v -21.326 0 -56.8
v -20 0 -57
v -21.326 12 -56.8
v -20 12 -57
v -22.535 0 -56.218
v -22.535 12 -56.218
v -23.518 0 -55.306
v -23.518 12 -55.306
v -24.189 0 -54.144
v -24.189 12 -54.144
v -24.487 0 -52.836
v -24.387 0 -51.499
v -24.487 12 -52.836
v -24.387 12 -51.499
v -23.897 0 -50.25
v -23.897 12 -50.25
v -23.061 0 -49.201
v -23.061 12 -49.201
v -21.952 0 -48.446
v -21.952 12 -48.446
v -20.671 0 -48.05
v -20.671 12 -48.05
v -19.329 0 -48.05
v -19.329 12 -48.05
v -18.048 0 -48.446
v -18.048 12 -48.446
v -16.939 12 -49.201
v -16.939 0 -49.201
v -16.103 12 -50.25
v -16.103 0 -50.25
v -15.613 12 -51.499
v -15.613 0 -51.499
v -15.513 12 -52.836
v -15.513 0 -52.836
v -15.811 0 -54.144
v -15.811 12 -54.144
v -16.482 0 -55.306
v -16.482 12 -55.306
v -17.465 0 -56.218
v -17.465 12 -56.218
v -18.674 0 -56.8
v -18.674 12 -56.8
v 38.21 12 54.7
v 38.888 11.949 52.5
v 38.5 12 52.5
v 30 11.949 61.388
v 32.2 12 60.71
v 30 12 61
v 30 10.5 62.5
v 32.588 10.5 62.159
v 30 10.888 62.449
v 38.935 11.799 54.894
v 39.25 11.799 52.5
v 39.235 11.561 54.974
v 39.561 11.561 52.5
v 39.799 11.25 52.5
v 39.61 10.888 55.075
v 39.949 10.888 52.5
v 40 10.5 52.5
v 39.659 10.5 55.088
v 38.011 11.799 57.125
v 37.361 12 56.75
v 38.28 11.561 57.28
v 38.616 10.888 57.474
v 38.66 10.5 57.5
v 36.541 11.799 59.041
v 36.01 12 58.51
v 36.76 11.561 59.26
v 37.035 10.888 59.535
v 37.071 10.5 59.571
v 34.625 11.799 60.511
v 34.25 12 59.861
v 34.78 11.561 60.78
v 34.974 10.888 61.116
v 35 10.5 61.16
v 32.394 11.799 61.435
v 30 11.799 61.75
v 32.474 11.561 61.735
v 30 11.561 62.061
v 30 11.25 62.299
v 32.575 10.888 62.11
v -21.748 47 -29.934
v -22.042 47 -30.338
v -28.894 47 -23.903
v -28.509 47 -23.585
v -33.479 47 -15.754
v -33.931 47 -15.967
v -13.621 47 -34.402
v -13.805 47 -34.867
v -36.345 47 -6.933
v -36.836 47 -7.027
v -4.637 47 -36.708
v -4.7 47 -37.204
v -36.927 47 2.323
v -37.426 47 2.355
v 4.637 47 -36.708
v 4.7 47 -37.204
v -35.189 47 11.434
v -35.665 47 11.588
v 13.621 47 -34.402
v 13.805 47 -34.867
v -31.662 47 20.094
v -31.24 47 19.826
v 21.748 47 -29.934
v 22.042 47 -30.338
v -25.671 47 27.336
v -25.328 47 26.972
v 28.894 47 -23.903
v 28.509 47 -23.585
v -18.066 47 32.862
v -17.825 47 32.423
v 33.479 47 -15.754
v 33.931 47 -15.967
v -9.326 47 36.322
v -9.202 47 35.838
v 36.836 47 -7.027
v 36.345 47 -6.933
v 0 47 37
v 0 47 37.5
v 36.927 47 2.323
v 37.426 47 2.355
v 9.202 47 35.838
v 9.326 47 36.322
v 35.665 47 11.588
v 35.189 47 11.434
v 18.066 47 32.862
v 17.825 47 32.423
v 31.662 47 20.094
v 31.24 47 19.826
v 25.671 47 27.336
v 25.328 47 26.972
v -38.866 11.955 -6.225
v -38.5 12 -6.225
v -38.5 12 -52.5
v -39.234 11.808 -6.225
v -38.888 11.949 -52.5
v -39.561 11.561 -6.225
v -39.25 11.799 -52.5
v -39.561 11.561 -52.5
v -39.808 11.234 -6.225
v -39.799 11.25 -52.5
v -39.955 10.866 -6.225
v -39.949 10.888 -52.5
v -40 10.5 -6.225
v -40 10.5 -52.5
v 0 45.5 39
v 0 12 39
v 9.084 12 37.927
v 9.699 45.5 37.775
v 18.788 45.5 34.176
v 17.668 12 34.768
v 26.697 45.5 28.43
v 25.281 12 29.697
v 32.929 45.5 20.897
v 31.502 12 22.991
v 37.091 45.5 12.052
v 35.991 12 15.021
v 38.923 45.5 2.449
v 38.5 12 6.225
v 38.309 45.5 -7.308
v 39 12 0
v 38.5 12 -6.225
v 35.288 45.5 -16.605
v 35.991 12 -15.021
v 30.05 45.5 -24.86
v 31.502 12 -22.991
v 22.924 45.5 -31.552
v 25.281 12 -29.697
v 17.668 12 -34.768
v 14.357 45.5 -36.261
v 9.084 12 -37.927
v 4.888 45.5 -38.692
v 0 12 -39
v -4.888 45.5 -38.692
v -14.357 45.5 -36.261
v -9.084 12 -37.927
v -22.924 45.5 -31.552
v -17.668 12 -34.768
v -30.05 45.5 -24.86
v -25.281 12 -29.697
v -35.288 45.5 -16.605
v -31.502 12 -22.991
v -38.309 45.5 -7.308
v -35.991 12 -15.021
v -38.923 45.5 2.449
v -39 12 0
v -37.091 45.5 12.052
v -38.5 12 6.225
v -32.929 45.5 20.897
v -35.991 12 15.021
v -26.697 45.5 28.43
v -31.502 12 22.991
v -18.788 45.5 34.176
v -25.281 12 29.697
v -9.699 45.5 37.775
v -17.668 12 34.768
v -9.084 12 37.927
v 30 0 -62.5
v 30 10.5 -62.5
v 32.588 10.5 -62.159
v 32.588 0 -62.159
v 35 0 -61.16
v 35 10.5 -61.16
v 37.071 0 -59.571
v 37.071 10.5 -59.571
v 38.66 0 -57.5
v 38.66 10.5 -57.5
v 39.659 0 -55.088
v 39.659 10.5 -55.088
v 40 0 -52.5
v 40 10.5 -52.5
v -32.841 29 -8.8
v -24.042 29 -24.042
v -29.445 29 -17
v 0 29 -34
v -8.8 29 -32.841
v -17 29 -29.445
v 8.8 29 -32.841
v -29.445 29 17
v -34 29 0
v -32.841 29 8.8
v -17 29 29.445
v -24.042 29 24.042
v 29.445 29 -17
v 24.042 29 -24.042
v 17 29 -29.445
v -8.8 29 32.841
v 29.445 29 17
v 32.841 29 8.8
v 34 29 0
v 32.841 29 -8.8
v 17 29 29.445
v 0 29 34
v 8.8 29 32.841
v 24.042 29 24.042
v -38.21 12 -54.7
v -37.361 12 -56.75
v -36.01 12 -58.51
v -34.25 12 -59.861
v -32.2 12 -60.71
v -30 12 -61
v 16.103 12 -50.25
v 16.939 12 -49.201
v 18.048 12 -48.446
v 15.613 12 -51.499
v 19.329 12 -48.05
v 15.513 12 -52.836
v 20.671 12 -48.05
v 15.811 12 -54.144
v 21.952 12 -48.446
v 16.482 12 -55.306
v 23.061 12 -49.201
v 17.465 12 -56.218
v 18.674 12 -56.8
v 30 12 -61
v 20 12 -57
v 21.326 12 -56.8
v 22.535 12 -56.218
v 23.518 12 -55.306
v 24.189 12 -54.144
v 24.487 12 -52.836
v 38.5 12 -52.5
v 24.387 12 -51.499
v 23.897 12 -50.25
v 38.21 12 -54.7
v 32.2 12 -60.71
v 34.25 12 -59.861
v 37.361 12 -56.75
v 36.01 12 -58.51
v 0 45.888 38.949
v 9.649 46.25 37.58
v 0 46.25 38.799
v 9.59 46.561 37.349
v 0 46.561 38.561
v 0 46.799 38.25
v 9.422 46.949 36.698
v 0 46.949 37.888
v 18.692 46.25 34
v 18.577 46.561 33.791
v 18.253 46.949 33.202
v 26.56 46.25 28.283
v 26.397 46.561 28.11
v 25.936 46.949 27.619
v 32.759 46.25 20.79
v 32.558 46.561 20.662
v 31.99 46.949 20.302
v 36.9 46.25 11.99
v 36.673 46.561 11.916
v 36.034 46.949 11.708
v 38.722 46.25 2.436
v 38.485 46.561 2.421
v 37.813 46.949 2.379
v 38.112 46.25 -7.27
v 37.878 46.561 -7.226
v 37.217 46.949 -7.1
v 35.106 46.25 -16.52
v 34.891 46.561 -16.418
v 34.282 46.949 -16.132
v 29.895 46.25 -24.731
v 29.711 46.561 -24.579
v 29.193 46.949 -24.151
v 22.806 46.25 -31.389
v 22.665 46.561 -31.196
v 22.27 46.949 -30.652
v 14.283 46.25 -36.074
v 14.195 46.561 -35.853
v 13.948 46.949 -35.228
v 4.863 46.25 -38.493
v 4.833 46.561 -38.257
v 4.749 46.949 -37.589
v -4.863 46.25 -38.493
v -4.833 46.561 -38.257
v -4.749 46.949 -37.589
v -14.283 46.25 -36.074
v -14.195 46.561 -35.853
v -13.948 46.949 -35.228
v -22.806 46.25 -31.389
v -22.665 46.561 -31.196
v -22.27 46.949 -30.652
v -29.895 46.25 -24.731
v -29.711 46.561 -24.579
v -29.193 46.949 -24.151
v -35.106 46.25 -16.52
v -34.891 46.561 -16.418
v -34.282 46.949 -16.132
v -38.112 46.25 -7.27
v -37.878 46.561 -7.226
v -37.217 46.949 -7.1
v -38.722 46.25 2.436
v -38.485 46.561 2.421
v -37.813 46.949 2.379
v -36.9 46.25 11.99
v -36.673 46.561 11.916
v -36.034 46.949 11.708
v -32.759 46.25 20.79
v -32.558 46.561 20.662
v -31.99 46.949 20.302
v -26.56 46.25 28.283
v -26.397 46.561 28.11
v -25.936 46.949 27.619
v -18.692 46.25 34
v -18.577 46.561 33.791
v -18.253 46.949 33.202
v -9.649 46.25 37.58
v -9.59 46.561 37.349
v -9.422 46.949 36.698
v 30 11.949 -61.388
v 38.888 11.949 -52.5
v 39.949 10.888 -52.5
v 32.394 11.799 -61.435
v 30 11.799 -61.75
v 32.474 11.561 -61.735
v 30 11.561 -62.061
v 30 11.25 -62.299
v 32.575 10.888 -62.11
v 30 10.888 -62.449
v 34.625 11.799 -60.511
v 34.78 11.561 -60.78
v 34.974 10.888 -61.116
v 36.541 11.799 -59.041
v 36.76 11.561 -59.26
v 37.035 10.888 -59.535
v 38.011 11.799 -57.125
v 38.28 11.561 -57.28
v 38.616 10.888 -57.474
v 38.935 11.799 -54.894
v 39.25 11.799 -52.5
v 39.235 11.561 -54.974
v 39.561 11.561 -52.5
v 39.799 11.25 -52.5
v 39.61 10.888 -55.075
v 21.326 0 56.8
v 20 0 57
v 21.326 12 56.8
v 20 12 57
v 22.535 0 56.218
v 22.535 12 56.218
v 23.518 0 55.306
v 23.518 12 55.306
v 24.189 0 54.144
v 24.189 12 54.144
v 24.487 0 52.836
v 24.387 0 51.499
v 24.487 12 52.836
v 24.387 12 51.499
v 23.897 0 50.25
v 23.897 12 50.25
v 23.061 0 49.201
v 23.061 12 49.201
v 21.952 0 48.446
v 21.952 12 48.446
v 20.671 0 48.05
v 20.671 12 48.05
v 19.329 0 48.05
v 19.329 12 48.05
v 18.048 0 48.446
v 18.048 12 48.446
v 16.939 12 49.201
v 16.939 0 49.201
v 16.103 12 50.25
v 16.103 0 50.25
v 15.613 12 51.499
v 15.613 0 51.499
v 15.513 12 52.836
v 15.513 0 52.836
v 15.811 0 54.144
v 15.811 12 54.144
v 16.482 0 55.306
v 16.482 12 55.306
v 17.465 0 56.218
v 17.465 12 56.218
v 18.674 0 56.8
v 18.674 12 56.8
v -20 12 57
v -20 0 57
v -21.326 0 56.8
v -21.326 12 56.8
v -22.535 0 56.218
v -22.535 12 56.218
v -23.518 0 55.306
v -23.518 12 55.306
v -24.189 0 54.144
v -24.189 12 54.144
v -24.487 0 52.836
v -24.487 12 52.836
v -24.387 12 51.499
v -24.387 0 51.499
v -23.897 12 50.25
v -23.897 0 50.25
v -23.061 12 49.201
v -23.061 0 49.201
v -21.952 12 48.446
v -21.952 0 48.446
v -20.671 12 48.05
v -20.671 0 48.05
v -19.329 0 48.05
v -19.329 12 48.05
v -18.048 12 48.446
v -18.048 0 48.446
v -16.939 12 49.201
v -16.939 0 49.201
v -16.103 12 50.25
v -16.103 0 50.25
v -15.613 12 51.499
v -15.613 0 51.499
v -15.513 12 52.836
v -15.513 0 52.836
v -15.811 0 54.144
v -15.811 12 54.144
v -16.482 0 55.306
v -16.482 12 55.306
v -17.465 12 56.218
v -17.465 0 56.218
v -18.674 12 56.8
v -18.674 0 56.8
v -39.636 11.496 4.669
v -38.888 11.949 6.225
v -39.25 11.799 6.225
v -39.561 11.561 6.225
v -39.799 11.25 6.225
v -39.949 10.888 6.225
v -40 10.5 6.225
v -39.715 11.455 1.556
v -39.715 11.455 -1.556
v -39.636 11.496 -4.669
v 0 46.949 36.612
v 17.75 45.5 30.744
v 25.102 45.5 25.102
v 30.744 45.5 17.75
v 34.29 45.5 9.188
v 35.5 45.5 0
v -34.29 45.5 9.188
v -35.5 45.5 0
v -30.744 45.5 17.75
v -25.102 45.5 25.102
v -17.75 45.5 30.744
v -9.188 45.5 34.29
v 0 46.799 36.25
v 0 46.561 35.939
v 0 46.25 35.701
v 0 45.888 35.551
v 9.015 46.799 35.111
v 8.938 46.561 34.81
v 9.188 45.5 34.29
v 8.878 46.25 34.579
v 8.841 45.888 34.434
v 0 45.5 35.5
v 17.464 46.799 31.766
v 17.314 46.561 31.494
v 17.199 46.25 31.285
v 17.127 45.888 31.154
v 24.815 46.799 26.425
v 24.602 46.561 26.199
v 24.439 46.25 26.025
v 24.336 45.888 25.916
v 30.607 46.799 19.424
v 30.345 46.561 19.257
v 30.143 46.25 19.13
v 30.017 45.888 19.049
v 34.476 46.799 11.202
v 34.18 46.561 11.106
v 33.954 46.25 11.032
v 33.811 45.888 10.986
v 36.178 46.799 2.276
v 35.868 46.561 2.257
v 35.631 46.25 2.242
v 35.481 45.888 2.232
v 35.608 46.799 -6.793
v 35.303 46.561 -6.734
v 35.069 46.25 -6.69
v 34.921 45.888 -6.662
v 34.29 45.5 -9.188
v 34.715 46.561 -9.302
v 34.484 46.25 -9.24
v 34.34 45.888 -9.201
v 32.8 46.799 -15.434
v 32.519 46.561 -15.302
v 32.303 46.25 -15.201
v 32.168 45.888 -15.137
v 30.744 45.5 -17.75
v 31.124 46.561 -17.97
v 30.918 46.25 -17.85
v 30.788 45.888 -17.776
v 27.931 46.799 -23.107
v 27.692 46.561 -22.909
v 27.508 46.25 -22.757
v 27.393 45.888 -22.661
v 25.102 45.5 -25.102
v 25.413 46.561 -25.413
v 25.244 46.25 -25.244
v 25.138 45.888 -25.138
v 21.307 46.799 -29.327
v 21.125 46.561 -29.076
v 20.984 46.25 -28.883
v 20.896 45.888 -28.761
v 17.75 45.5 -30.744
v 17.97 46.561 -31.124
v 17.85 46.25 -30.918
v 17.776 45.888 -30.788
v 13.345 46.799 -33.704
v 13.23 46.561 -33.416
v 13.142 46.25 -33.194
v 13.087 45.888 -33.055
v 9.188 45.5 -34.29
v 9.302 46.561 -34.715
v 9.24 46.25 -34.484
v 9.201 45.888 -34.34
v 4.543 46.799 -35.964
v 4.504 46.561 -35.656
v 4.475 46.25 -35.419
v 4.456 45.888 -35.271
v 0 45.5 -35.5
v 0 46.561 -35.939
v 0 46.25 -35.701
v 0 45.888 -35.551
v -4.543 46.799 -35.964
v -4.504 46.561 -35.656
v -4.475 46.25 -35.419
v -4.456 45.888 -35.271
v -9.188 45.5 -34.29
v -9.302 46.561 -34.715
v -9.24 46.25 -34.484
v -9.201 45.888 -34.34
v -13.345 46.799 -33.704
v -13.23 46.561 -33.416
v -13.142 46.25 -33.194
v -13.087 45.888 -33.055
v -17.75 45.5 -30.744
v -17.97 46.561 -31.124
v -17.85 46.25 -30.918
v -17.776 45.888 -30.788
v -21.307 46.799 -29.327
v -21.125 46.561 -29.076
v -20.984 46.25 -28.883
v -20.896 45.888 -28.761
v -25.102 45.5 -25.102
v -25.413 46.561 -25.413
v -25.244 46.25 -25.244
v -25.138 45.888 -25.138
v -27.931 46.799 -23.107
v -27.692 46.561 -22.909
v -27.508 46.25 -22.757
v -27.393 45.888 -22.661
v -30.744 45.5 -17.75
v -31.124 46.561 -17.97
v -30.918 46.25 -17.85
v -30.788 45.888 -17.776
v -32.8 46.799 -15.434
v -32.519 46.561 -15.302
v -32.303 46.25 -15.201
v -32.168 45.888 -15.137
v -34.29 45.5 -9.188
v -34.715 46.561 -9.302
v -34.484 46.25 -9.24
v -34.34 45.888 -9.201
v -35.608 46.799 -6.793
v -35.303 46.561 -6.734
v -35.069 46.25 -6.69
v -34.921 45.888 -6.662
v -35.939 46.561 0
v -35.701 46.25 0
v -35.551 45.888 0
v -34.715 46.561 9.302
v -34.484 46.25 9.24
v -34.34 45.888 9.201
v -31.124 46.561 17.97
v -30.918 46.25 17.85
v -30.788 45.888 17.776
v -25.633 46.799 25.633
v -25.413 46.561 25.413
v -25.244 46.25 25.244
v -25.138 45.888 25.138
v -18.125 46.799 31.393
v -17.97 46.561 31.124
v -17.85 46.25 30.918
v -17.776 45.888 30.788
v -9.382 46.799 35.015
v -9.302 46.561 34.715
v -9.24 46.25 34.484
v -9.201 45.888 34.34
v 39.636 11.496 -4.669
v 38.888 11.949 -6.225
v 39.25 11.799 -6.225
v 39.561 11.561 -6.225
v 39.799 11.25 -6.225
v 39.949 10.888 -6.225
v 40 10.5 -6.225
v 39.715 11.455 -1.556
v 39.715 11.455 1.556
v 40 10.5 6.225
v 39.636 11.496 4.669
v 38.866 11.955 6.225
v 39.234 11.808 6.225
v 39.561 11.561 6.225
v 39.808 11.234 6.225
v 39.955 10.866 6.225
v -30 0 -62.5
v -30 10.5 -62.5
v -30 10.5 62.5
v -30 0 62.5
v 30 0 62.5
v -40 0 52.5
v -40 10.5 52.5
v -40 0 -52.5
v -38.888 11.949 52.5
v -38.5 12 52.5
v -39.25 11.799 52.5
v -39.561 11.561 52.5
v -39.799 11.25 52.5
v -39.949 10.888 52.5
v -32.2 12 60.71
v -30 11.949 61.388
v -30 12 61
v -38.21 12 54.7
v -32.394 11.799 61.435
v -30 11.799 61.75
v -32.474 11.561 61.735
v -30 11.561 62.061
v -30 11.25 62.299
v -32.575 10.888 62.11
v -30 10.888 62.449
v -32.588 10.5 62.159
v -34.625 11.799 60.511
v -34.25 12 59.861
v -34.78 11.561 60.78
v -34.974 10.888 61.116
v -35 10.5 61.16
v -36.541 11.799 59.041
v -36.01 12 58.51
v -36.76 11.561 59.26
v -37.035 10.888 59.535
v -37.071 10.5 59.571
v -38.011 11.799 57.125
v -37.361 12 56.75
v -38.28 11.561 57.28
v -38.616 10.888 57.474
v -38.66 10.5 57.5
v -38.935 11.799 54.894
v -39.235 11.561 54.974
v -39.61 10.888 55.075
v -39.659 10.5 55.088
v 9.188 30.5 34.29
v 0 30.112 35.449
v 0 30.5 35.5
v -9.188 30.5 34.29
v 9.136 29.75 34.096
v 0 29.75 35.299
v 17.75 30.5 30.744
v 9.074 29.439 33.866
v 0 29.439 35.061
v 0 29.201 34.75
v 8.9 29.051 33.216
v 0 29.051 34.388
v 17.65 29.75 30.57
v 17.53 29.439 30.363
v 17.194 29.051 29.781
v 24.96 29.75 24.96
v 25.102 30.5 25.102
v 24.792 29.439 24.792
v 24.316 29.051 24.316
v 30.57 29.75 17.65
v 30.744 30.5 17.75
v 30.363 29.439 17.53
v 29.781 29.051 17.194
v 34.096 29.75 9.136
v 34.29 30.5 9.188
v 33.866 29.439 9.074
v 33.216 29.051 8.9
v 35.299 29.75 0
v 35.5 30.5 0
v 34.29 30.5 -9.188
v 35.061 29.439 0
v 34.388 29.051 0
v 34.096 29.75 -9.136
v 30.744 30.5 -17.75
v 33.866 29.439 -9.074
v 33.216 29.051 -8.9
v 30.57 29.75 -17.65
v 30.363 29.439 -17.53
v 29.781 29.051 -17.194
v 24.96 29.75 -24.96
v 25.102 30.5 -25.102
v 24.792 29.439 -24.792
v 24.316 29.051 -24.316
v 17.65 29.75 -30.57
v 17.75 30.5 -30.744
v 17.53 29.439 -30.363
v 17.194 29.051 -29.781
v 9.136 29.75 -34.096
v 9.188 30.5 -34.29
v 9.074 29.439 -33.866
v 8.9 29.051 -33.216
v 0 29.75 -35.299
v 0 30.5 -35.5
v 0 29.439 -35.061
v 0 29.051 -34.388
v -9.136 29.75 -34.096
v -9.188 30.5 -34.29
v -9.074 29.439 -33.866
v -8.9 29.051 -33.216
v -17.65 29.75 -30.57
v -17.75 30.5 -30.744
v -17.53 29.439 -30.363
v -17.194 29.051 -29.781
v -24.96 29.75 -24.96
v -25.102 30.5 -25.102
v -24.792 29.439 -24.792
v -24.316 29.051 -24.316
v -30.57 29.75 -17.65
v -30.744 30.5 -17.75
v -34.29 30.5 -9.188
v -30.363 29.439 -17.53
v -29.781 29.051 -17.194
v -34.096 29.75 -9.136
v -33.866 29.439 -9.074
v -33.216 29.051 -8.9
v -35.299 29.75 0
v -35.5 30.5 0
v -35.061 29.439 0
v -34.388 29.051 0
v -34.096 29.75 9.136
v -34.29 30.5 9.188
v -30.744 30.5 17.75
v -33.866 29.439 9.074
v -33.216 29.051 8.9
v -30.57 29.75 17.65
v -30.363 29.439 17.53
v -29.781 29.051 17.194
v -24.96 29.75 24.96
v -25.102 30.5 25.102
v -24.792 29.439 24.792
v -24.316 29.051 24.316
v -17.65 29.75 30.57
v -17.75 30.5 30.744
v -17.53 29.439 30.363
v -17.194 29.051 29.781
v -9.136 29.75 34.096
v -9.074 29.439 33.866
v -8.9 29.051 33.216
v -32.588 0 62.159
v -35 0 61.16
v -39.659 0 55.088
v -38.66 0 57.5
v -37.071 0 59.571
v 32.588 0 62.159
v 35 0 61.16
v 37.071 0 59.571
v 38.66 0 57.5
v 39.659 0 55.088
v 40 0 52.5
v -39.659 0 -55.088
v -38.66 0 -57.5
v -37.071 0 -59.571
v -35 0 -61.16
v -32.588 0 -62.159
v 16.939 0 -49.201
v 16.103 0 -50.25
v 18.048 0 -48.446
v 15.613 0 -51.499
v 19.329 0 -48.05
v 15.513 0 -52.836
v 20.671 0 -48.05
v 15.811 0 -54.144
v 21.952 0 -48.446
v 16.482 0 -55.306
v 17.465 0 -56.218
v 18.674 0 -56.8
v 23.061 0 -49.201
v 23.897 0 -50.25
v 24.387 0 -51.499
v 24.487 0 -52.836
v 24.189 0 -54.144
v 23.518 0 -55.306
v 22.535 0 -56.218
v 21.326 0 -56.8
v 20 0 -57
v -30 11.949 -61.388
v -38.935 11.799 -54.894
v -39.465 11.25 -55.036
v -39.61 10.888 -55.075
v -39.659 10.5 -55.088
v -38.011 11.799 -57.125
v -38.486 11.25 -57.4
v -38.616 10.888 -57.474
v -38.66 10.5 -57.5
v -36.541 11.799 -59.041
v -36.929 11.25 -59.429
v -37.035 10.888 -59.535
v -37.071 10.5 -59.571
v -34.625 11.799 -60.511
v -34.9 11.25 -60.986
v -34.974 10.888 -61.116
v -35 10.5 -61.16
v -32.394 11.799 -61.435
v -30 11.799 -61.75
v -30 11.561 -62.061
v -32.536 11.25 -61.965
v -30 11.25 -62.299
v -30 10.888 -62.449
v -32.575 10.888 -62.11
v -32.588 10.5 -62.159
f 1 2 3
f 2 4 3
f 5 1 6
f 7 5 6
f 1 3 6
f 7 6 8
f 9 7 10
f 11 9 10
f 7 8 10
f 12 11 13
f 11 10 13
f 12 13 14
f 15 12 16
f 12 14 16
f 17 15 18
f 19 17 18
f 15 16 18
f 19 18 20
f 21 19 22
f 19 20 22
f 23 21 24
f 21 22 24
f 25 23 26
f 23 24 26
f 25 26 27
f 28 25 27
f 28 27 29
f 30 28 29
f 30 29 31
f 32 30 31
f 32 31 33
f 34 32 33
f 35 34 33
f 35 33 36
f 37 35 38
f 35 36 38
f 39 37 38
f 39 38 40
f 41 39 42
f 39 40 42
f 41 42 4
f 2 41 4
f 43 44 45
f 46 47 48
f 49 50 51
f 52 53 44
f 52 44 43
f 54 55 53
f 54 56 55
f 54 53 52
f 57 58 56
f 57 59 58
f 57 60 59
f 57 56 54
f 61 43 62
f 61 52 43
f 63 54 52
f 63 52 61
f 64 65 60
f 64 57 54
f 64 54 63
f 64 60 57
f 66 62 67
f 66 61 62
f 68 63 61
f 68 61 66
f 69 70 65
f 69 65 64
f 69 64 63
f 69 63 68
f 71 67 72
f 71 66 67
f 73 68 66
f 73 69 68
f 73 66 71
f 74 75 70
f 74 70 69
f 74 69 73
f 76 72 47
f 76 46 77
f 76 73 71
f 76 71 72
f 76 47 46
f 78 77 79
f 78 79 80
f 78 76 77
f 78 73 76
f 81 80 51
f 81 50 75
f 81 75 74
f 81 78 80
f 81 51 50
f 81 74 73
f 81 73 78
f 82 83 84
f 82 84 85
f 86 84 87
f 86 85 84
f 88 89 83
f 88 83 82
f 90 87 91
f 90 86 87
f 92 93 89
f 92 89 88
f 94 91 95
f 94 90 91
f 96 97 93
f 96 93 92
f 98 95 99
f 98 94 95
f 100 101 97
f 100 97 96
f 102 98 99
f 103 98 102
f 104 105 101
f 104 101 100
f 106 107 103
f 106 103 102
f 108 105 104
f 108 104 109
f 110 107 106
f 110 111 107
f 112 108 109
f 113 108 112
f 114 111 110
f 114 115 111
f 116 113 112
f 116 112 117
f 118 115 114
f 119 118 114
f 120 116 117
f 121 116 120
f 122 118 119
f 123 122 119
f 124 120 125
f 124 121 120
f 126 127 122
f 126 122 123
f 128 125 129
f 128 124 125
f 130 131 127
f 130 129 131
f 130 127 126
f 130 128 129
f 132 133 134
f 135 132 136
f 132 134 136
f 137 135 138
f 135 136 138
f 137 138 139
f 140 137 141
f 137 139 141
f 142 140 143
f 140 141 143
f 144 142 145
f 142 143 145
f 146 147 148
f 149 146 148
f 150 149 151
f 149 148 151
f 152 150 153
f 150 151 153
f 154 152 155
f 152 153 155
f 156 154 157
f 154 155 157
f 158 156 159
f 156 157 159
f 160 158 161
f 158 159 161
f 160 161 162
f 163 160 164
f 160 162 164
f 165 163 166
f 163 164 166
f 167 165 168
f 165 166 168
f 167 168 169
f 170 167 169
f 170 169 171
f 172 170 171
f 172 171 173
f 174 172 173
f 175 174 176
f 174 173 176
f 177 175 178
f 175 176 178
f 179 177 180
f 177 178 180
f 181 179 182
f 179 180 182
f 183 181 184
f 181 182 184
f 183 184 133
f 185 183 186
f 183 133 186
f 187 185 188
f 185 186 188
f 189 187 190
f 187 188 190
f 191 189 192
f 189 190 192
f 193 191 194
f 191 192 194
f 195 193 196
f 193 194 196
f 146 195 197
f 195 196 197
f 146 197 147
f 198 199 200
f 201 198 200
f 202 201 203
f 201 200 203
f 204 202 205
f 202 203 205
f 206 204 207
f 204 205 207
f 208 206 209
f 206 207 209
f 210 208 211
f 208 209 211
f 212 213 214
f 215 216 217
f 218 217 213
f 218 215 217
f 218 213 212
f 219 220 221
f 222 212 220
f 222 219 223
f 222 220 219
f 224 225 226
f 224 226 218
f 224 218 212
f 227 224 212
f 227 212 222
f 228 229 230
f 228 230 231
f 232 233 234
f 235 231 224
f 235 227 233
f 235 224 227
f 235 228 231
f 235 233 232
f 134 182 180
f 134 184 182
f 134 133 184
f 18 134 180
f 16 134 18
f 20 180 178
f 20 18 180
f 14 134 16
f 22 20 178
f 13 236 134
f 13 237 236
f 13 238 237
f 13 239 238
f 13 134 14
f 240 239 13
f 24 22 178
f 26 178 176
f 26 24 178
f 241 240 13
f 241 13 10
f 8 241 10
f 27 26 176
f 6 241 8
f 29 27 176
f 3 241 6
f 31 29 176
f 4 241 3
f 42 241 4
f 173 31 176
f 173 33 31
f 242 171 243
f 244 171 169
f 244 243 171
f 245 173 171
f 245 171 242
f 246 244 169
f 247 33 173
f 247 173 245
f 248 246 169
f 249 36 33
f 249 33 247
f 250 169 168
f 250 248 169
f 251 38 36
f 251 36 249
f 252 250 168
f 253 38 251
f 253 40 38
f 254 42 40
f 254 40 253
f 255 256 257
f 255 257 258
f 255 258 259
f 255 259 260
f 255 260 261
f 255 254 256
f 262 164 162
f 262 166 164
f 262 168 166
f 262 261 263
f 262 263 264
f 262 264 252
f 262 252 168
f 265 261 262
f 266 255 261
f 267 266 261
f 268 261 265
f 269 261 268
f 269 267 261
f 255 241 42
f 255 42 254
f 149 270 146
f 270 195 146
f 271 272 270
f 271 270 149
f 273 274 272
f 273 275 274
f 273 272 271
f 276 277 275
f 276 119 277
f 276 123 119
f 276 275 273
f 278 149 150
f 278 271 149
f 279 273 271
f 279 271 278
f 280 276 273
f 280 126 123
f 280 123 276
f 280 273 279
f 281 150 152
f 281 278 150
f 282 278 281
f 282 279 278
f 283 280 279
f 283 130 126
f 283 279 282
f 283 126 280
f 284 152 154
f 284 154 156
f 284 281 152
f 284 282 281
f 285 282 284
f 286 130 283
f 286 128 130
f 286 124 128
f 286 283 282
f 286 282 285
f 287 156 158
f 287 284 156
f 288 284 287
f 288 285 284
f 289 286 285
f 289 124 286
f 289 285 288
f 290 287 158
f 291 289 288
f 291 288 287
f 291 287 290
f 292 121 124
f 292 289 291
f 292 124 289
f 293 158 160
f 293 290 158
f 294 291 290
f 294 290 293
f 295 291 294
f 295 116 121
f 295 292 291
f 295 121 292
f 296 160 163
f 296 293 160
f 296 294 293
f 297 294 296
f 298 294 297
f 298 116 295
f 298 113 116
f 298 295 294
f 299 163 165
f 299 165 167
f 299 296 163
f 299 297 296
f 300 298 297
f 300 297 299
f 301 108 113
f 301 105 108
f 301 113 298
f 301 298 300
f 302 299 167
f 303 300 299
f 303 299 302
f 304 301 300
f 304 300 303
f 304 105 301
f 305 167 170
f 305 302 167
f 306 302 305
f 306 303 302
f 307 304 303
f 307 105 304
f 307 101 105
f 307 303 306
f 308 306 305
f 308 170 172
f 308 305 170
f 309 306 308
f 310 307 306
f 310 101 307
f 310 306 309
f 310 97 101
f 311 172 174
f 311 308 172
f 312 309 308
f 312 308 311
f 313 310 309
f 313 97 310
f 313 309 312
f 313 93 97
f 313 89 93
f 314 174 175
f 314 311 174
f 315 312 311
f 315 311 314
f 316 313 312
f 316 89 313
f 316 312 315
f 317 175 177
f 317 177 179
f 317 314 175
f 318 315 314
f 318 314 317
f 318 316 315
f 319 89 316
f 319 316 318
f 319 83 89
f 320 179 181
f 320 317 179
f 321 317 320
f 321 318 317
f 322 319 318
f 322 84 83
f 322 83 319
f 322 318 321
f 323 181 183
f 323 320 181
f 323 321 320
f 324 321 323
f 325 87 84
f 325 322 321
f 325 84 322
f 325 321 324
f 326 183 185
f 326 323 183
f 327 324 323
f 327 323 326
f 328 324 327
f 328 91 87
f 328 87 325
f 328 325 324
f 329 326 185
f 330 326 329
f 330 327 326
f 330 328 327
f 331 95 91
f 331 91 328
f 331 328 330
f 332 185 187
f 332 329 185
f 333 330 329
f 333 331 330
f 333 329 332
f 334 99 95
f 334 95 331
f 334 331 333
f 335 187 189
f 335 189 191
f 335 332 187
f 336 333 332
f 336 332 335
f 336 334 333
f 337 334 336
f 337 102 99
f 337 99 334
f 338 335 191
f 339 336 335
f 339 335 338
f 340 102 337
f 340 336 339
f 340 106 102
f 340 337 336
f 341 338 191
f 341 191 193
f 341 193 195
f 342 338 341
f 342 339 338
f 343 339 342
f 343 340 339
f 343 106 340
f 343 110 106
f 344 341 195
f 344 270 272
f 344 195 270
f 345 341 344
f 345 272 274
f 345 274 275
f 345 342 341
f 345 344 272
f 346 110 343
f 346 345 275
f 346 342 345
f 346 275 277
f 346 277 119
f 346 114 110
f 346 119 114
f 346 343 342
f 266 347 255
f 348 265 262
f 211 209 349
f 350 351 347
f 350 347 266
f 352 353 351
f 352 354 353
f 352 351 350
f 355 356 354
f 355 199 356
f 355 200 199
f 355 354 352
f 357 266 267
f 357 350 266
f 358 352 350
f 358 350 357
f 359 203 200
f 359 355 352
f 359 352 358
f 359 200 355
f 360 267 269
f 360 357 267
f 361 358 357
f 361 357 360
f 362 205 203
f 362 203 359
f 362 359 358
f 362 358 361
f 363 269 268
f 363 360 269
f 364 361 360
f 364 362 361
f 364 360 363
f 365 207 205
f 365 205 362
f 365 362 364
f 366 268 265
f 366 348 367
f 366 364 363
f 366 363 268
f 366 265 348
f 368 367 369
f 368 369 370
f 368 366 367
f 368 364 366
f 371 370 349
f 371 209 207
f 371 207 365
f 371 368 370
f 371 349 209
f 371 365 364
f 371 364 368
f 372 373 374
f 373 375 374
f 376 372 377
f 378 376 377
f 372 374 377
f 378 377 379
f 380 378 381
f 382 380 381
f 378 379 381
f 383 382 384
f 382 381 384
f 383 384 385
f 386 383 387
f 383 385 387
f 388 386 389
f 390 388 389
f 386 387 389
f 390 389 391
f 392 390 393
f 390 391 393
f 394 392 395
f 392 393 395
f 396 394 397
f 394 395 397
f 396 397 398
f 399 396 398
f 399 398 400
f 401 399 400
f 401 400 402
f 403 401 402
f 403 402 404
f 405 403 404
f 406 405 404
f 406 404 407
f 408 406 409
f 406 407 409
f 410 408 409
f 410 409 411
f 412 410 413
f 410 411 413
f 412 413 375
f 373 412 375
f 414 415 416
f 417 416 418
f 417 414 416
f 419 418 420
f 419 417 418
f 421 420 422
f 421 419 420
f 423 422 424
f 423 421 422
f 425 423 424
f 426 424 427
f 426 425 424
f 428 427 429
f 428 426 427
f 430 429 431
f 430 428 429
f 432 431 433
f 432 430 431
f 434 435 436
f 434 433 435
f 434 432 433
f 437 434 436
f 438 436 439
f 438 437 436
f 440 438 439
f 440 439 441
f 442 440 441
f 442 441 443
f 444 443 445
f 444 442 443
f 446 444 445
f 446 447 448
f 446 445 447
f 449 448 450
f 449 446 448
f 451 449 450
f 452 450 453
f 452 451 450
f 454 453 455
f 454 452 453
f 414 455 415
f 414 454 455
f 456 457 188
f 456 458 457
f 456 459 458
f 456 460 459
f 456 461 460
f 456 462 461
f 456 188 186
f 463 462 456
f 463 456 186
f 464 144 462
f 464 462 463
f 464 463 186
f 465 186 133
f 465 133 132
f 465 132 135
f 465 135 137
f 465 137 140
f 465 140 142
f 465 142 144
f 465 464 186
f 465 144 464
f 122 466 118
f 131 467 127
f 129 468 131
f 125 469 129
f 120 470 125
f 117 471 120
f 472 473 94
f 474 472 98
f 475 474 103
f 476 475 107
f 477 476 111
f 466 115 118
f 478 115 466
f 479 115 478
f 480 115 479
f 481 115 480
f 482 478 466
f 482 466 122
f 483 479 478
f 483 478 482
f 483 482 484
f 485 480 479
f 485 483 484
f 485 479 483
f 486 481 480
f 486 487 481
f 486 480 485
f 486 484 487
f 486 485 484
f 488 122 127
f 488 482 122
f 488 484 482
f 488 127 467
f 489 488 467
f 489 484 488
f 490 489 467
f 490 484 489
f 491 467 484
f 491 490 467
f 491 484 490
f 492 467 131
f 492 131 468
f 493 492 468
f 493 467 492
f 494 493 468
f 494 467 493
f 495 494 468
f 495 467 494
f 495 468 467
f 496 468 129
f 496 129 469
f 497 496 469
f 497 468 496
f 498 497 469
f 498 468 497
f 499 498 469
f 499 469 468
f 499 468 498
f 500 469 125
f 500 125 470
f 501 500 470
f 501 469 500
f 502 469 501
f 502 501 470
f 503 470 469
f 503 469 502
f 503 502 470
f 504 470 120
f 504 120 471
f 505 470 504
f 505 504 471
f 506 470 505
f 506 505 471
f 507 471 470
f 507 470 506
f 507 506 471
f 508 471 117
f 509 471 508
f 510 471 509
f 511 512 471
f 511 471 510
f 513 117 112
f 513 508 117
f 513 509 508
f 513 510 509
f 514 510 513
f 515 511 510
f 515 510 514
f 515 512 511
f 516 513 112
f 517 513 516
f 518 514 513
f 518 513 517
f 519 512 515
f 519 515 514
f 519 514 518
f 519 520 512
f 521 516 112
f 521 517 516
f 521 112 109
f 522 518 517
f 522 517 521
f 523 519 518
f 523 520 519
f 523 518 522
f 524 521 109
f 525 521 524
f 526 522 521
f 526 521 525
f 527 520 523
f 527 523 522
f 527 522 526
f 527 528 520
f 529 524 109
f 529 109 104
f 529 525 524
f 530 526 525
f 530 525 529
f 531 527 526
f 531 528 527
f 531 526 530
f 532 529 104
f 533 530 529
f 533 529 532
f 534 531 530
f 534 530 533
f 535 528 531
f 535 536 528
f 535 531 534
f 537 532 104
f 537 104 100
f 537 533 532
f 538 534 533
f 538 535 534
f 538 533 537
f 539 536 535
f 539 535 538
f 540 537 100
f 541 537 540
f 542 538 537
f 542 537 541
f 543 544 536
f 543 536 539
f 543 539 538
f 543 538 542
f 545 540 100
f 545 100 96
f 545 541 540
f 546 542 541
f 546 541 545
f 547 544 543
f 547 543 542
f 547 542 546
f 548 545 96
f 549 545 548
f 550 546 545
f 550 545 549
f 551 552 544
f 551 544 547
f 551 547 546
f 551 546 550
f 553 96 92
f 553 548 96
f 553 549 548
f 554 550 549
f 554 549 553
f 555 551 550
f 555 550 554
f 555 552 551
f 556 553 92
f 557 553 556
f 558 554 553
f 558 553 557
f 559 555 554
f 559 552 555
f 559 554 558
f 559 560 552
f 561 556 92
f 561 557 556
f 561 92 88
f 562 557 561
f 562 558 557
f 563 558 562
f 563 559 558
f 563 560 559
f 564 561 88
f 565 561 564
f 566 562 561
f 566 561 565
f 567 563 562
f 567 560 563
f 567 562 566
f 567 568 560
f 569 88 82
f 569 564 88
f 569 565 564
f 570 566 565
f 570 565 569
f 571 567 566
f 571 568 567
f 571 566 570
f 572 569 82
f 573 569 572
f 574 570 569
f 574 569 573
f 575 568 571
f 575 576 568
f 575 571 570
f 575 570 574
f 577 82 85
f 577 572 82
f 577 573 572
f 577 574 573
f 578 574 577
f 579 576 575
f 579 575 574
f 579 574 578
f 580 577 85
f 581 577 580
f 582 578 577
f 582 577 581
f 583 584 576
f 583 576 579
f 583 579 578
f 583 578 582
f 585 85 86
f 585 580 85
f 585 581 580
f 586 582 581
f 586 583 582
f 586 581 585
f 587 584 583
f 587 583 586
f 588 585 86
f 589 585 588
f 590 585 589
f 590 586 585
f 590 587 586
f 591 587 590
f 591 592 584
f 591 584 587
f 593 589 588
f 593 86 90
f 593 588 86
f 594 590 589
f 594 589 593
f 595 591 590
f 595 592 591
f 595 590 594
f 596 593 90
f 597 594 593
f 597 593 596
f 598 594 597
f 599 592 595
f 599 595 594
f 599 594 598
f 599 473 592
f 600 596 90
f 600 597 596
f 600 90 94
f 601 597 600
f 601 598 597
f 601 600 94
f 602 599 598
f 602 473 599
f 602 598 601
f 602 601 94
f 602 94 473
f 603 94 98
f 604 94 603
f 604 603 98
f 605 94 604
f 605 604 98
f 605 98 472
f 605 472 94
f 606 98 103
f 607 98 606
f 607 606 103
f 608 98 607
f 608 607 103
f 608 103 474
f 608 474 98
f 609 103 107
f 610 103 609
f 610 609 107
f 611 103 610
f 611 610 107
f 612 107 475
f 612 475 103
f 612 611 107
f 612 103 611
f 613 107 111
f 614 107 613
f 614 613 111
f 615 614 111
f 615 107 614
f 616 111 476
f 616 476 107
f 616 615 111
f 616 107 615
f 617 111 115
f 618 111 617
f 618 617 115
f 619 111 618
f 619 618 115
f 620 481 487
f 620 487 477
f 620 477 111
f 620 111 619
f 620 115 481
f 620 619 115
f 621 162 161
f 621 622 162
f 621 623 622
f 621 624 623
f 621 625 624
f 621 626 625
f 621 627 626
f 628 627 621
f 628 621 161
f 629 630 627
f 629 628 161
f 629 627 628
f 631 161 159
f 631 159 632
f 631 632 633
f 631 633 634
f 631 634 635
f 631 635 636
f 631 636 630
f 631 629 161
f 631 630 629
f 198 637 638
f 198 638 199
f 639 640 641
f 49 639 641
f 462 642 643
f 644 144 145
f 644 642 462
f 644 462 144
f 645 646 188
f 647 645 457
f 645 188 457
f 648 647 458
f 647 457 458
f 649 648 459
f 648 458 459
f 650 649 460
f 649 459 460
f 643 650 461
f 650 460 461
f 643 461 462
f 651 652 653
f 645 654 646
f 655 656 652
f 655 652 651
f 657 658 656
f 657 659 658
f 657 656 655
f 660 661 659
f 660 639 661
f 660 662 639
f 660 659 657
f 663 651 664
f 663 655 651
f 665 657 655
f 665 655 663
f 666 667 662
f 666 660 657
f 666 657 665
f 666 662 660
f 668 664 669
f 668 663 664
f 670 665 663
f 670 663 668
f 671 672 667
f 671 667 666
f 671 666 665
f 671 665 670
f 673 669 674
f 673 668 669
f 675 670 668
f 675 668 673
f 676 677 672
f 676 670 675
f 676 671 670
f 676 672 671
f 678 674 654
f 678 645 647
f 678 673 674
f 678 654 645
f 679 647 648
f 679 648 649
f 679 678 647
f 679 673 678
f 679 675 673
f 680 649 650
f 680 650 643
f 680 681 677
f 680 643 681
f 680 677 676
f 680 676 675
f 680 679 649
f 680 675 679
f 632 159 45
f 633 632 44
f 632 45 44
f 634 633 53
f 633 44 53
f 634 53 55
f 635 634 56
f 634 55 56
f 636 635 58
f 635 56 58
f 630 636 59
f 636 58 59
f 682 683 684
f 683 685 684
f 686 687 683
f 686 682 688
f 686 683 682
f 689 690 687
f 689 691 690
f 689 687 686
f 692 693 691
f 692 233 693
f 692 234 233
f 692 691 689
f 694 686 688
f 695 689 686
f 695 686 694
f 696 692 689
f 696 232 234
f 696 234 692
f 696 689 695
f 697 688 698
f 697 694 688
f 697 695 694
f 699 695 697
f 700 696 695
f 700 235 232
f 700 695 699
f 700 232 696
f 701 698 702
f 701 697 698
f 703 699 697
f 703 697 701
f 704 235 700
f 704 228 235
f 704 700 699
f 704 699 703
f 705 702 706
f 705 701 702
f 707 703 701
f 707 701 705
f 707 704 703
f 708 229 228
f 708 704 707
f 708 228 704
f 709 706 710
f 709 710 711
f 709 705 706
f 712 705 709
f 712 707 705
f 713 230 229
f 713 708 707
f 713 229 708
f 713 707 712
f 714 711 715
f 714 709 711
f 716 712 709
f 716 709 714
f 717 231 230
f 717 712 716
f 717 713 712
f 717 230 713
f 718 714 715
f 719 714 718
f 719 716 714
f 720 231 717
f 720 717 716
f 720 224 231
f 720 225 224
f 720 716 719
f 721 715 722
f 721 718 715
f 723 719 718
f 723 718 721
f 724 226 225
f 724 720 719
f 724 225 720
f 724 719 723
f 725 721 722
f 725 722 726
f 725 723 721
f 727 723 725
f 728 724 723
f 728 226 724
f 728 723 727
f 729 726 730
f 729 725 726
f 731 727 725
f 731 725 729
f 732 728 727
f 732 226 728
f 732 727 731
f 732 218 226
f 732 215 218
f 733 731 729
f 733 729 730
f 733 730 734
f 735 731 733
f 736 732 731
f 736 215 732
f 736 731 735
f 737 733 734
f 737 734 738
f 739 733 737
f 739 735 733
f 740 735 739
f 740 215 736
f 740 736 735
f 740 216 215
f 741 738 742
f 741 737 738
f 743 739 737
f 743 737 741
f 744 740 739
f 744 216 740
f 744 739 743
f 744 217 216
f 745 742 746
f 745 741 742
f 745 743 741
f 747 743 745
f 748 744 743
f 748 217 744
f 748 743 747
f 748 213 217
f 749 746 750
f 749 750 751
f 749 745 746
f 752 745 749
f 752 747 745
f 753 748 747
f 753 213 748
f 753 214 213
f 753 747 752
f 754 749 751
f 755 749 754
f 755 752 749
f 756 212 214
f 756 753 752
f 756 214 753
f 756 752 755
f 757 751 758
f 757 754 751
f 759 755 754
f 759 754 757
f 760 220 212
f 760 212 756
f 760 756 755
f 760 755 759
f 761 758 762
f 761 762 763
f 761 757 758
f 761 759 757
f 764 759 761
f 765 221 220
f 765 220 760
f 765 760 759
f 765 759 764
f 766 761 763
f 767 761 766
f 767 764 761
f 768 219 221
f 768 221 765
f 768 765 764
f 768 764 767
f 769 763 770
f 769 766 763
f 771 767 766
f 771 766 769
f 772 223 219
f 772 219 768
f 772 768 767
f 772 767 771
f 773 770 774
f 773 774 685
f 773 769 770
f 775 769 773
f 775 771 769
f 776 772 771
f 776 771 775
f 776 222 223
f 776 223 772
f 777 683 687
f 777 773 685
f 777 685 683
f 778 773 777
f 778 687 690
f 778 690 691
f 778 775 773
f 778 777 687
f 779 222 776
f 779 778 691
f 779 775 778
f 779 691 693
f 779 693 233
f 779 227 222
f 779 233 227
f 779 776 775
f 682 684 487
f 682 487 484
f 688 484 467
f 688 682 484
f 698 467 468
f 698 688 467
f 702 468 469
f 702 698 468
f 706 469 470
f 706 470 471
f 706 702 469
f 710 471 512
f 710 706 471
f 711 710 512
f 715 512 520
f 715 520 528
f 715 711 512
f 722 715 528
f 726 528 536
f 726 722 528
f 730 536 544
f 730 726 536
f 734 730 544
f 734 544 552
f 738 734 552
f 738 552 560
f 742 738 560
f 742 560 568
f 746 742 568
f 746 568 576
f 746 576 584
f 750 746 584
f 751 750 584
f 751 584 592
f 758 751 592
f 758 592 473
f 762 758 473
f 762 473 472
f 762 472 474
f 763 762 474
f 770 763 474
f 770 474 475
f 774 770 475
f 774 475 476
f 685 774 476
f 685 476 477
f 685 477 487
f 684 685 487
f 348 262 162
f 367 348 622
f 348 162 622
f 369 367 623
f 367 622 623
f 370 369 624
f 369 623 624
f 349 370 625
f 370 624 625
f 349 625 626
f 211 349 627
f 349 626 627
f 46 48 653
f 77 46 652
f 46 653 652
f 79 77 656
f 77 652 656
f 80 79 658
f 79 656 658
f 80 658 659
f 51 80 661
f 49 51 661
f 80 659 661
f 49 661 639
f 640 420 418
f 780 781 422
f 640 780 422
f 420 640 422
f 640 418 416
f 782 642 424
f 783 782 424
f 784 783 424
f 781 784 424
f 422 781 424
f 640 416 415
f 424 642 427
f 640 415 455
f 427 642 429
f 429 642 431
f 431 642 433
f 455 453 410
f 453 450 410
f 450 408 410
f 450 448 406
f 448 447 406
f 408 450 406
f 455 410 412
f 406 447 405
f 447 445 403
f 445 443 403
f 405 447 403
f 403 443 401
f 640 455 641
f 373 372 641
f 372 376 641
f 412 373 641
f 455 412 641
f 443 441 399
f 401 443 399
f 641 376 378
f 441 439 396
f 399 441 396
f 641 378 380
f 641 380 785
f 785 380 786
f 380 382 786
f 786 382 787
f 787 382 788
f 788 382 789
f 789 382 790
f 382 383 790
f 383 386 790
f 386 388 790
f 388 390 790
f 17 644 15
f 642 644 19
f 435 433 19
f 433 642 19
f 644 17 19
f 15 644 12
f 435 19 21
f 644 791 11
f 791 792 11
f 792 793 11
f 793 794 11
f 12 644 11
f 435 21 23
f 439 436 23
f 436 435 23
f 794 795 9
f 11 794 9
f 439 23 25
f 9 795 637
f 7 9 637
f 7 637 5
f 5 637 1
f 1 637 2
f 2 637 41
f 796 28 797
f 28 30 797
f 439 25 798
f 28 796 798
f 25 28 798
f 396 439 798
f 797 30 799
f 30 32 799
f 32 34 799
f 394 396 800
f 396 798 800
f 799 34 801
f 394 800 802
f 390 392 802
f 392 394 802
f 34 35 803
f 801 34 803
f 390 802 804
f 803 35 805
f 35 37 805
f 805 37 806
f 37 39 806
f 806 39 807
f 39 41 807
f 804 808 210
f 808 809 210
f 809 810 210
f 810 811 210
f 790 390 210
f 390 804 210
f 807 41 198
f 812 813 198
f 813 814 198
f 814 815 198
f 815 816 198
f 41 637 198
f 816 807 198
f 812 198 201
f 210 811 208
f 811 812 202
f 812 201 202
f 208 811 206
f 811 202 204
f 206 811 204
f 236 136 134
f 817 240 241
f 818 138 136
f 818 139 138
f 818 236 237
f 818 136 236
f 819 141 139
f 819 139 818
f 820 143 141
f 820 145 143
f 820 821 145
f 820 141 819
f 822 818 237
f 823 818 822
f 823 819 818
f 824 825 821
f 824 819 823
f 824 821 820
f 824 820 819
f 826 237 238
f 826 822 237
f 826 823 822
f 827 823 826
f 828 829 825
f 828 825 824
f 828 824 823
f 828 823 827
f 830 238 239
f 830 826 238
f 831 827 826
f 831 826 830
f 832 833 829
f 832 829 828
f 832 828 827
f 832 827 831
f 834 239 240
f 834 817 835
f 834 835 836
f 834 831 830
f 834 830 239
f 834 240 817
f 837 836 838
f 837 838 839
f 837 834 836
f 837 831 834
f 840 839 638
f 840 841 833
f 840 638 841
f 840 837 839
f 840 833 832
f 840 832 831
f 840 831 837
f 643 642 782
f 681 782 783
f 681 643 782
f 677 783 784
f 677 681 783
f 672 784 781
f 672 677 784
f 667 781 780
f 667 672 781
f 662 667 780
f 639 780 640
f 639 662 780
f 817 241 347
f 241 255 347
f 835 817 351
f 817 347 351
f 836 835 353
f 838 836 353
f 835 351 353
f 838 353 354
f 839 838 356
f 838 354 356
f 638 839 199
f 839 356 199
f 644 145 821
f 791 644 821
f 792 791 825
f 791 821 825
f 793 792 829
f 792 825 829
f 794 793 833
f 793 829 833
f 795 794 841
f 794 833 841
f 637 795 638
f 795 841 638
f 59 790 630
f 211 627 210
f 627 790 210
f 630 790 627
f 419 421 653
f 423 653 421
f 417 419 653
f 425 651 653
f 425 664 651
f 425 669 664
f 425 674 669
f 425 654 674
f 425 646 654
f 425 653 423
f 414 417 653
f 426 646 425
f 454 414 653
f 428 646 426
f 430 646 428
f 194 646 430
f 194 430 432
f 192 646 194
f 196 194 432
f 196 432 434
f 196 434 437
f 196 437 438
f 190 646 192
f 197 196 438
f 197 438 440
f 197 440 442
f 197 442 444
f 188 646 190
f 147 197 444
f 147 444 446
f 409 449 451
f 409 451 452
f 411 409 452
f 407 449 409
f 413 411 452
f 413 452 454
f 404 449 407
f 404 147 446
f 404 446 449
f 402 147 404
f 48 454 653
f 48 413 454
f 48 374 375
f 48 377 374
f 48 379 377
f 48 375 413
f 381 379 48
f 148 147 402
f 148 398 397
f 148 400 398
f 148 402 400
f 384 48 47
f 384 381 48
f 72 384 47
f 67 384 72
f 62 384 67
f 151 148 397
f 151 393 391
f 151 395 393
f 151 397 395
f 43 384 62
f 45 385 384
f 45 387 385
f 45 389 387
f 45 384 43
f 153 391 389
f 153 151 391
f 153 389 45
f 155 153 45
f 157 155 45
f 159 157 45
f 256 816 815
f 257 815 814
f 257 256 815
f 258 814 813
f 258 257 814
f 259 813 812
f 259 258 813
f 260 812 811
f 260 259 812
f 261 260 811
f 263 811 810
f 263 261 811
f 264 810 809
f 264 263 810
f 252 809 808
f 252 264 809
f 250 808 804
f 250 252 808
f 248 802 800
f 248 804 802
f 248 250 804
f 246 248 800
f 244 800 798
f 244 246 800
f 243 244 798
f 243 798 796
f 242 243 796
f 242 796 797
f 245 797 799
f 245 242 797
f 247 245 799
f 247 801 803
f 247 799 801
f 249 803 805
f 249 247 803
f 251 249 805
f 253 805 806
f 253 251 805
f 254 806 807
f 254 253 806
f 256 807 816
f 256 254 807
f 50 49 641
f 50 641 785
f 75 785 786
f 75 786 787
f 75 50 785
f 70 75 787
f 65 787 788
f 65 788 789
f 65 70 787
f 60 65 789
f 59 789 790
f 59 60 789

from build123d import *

# Parameters (mm, degrees)
SZKIC1_W                    = 80
SZKIC1_H                    = 125
DODANIE_WYCI_GNI_CIE1_DEPTH = 12
SZKIC2_R                    = 39
SZKIC2_R_2                  = 35.5
DODANIE_WYCI_GNI_CIE2_DEPTH = 35
SZKIC4_R                    = 35.5
DODANIE_WYCI_GNI_CIE3_DEPTH = 17
ZAOKR_GLENIE1_R             = 10
ZAOKR_GLENIE2_R             = 1.5


with BuildPart() as part:
    # Szkic1 → Dodanie-wyciągnięcie1 (new body)
    with BuildSketch(Plane(origin=(0, 0, 0), x_dir=(1, 0, 0), z_dir=(0, 1, 0))):
        Rectangle(SZKIC1_W, SZKIC1_H)
    extrude(amount=DODANIE_WYCI_GNI_CIE1_DEPTH)

    # Szkic2 → Dodanie-wyciągnięcie2 (add)
    with BuildSketch(Plane(origin=(0, 12, 0), x_dir=(1, 0, 0), z_dir=(0, 1, 0))):
        with Locations(Location((0, 0, 0), (0, 0, 270))):
            Circle(SZKIC2_R)
        with Locations(Location((0, 0, 0), (0, 0, 270))):
            Circle(SZKIC2_R_2, mode=Mode.SUBTRACT)
    extrude(amount=DODANIE_WYCI_GNI_CIE2_DEPTH)

    # Szkic4 → Dodanie-wyciągnięcie3 (add)
    with BuildSketch(Plane(origin=(0, 12, 0), x_dir=(1, 0, 0), z_dir=(0, 1, 0))):
        with Locations(Location((0, 0, 0), (0, 0, 270))):
            Circle(SZKIC4_R)
    extrude(amount=DODANIE_WYCI_GNI_CIE3_DEPTH)

    # Zaokrąglenie1
    zaokr_glenie1_edges = [part.edges().sort_by_distance(p)[0] for p in [
        (-40, 6, -62.5),
        (40, 6, -62.5),
        (40, 6, 62.5),
        (-40, 6, 62.5),
    ]]
    fillet(zaokr_glenie1_edges, radius=ZAOKR_GLENIE1_R)

    # Zaokrąglenie2
    zaokr_glenie2_edges = [part.edges().sort_by_distance(p)[0] for p in [
        (0, 47, -39),
        (0, 47, -35.5),
        (0, 29, -35.5),
        (0, 12, -62.5),
        (40, 12, 0),
        (-40, 12, 0),
        (0, 12, 62.5),
        (37.071067812, 12, 59.571067812),
        (-37.071067812, 12, 59.571067812),
        (-37.071067812, 12, -59.571067812),
        (37.071067812, 12, -59.571067812),
    ]]
    fillet(zaokr_glenie2_edges, radius=ZAOKR_GLENIE2_R)

    # Szkic9 → Otwór pod śrubę M82 (revolve, cut)
    with BuildSketch(Plane(origin=(-20, 12, 52.5), x_dir=(0, 0, 1), z_dir=(1, 0, 0))):
        Polygon((0, 0), (0, 18.703872786), (4.5, 16), (4.5, 0), align=None)
    otw_r_pod_rub_m82 = revolve(axis=Axis((-20, 18.35, 52.5), (0, -1, 0)), mode=Mode.SUBTRACT)

    # Lustro3: Otwór pod śrubę M82 across plane
    add(otw_r_pod_rub_m82.mirror(Plane(origin=(0, 0, 0), x_dir=(0, 0, 1), z_dir=(1, 0, 0))), mode=Mode.SUBTRACT)

    # Lustro4: Otwór pod śrubę M82 across plane
    add(otw_r_pod_rub_m82.mirror(Plane.XY), mode=Mode.SUBTRACT)

    # Lustro4 copy 1 sketch → Lustro4 copy 1 (revolve, cut)
    with BuildSketch(Plane(origin=(20, 12, -52.5), x_dir=(0, 0, -1), z_dir=(-1, 0, 0))):
        Polygon((0, 0), (0, 18.703872786), (4.5, 16), (4.5, 0), align=None)
    revolve(axis=Axis((20, 18.35, -52.5), (0, -1, 0)), mode=Mode.SUBTRACT)


solid = part.part
